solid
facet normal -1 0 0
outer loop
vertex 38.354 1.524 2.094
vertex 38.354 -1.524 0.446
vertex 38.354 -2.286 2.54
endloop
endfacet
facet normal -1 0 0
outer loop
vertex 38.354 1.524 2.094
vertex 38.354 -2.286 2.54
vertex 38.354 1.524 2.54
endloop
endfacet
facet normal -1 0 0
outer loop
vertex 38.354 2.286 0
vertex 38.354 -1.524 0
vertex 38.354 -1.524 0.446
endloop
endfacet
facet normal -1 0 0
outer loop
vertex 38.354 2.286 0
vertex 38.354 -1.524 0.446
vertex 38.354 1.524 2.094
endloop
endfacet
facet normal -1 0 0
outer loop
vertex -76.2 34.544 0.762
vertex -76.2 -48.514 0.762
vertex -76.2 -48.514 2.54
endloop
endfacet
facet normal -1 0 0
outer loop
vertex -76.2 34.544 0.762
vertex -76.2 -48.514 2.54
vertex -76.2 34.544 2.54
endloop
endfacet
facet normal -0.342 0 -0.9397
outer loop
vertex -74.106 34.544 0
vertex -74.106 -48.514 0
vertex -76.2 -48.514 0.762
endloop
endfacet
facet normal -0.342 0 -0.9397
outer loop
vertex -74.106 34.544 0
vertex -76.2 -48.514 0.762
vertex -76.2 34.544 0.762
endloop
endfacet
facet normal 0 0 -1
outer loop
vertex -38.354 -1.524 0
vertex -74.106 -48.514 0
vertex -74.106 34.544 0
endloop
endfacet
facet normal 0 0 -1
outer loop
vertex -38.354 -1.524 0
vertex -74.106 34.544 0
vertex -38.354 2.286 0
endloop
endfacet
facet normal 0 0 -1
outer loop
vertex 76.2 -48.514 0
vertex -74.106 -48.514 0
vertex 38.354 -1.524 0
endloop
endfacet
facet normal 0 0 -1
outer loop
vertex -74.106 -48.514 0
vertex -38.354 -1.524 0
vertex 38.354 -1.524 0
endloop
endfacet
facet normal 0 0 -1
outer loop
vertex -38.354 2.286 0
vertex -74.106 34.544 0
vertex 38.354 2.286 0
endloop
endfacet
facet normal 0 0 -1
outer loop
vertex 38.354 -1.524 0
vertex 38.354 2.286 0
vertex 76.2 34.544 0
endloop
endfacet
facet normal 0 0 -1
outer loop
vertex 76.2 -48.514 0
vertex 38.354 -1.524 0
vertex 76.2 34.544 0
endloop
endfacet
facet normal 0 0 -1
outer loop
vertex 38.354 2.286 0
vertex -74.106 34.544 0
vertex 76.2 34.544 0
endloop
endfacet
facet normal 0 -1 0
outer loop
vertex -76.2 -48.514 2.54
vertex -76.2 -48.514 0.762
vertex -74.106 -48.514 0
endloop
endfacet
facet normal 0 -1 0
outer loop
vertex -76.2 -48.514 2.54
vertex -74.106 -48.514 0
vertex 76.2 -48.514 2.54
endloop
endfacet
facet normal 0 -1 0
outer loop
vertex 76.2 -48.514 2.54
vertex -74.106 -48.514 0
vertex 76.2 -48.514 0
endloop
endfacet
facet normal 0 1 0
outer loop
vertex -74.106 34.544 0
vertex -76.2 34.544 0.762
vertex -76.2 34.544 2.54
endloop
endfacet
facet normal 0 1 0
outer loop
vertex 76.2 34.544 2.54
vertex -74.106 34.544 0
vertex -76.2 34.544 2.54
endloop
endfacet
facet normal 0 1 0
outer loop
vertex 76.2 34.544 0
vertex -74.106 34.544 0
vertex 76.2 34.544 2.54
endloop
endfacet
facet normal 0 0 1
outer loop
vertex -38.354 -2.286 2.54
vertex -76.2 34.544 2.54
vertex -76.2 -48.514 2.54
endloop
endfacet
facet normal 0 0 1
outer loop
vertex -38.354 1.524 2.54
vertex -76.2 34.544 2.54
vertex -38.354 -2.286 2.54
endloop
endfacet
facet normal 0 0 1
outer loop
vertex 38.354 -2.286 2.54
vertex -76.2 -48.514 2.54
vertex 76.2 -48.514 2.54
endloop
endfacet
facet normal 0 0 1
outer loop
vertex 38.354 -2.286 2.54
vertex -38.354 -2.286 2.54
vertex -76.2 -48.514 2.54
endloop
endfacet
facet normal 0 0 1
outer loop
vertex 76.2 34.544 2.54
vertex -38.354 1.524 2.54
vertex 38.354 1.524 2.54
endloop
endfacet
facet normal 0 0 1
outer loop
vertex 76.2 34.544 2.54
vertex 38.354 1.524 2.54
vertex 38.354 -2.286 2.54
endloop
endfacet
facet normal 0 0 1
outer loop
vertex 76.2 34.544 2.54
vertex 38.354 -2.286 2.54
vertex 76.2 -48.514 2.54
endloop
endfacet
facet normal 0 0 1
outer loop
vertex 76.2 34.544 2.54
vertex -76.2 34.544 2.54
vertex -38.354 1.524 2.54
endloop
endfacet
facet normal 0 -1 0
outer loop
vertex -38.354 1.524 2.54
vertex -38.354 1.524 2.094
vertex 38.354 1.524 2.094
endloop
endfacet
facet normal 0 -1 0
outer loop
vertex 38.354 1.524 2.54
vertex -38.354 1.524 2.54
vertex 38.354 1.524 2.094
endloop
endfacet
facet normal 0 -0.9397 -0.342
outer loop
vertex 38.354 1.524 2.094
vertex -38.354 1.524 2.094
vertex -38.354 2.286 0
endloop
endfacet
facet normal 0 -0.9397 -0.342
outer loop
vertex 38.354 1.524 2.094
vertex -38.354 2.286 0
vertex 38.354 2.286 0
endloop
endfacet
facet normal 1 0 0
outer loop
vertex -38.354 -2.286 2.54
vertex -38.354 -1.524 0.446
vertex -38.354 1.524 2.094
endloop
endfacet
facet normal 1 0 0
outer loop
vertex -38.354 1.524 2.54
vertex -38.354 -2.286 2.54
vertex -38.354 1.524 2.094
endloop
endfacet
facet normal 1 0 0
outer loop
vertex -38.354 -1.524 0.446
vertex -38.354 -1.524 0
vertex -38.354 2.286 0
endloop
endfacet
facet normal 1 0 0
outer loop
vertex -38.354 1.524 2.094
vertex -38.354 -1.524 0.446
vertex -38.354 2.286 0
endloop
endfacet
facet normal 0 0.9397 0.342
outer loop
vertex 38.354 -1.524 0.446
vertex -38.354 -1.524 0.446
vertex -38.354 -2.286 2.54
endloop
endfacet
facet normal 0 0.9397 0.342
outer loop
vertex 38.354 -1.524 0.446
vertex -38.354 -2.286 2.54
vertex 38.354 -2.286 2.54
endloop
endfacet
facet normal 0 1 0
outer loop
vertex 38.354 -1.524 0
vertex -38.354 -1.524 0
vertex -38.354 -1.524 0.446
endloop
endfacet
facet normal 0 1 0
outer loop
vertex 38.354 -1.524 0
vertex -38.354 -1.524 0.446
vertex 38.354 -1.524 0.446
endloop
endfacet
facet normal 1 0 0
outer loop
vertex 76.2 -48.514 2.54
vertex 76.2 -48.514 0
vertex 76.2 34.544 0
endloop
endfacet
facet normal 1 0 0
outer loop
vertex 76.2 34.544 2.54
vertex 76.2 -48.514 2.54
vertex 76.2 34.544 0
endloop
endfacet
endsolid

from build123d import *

# Parameters (mm, degrees)
F0_W       = 152.4
F0_H       = 83.058
F0_W_2     = 76.708
F0_H_2     = 3.048
F1_DEPTH   = 2.54
F2_SIZE2   = 2.0935777936
F2_SIZE    = 0.762
F3_SIZE2   = 2.0935777936
F3_SIZE    = 0.762
F3_2_SIZE2 = 2.0935777936
F3_2_SIZE  = 0.762


with BuildPart() as f1:
    # F0 (on Top) → F1 (new body)
    with BuildSketch(Plane.XY):
        with Locations((0, -6.985)):
            Rectangle(F0_W, F0_H)
        Rectangle(F0_W_2, F0_H_2, mode=Mode.SUBTRACT)
    extrude(amount=F1_DEPTH)

    # F2
    f2_edges = [f1.edges().sort_by_distance(p)[0] for p in [
        (0, 1.524, 0),
    ]]
    f2_side = f1.faces().sort_by_distance((0, -7.116448, 0))[0]
    chamfer(f2_edges, length=F2_SIZE, length2=F2_SIZE2, reference=f2_side)

    # F3
    f3_edges = [f1.edges().sort_by_distance(p)[0] for p in [
        (0, -1.524, 2.54),
    ]]
    f3_side = f1.faces().sort_by_distance((0, -7.116448, 2.54))[0]
    chamfer(f3_edges, length=F3_SIZE, length2=F3_SIZE2, reference=f3_side)

    # F3#2
    f3_2_edges = [f1.edges().sort_by_distance(p)[0] for p in [
        (-76.2, -6.985, 0),
    ]]
    f3_2_side = f1.faces().sort_by_distance((-76.2, -6.985, 1.27))[0]
    chamfer(f3_2_edges, length=F3_2_SIZE, length2=F3_2_SIZE2, reference=f3_2_side)


solid = f1.part
